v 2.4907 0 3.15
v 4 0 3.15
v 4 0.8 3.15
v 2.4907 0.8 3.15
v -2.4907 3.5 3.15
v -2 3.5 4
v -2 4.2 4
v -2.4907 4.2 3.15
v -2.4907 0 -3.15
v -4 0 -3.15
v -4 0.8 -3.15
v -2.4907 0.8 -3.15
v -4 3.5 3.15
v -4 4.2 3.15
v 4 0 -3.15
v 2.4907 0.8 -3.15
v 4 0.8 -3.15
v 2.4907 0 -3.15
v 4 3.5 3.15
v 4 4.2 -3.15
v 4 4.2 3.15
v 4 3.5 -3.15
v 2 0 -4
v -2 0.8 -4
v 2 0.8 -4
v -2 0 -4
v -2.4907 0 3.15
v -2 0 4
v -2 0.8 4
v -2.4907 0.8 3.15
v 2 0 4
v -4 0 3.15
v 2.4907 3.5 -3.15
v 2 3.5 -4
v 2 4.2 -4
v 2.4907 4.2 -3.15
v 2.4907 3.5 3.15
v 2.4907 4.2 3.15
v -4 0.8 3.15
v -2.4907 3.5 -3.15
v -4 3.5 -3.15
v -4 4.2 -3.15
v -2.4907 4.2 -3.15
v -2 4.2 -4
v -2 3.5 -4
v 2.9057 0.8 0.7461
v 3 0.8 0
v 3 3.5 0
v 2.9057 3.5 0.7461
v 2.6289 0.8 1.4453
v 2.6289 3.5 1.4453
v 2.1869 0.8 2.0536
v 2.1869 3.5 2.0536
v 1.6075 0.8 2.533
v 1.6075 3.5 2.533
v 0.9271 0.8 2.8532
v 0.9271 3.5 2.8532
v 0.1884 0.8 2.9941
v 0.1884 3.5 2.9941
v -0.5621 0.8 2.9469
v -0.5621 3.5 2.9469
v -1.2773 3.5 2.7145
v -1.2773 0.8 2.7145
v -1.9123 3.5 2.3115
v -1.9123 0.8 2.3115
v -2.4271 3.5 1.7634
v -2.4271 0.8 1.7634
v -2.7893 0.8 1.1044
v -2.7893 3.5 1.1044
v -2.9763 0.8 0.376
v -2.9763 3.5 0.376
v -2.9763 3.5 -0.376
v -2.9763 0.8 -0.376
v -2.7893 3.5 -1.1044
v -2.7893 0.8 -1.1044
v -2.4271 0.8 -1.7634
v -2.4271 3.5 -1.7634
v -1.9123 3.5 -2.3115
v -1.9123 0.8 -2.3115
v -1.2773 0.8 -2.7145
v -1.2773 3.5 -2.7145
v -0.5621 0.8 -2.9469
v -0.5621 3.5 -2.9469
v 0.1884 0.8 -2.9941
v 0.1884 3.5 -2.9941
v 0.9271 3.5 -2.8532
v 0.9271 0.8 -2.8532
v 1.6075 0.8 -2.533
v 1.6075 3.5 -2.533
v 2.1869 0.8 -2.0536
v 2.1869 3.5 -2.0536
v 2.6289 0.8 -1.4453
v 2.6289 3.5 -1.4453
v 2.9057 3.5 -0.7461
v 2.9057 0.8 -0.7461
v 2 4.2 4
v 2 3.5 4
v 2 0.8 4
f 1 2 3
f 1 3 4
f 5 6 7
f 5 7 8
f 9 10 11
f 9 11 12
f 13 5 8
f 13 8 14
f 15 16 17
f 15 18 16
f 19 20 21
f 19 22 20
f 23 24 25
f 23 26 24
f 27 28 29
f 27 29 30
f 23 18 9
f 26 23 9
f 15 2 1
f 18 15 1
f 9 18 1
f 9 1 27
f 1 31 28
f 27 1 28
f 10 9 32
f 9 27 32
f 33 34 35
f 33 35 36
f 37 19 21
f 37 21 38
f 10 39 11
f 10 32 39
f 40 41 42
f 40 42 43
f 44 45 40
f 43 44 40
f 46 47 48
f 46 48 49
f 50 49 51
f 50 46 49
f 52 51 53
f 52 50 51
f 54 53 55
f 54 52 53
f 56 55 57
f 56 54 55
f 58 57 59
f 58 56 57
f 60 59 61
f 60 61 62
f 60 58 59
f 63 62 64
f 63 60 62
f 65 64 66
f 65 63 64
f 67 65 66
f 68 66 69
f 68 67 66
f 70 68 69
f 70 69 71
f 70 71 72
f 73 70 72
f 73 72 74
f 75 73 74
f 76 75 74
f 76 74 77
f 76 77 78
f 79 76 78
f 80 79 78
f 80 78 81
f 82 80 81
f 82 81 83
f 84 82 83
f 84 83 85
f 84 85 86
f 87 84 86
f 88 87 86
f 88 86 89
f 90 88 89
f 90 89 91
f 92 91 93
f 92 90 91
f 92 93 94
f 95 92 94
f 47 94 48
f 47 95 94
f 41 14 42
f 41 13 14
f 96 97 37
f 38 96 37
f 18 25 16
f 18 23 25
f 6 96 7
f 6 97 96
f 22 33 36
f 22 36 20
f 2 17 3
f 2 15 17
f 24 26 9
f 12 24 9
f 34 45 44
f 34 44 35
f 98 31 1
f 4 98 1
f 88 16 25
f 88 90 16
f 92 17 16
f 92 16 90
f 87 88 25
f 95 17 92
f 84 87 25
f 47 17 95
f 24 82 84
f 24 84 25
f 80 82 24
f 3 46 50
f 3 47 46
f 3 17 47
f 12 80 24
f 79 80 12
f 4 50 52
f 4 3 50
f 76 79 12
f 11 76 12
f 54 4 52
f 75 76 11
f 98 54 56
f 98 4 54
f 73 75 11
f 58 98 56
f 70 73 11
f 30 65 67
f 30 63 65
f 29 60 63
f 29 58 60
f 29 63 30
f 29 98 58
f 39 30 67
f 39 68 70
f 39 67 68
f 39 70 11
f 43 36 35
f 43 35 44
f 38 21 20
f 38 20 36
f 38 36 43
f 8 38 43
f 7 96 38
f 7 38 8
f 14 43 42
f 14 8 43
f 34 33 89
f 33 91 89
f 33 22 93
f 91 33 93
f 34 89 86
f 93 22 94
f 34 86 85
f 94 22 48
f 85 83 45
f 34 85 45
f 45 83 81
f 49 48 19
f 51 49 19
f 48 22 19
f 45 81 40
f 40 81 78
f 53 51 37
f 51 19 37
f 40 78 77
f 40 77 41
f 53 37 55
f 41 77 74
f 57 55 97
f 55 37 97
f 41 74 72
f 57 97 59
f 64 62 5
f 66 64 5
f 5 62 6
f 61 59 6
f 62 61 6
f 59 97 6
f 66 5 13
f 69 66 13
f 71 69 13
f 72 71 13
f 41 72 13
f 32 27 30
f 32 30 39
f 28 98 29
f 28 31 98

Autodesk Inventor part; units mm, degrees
ref_plane "YZ Plane" through (0, 0, 0) normal (1, 0, 0) x (0, 1, 0)
ref_plane "XZ Plane" through (0, 0, 0) normal (0, 1, 0) x (-1, 0, 0)
ref_plane "XY Plane" through (0, 0, 0) normal (0, 0, 1) x (1, 0, 0)
sketch "Sketch1" plane through (0, 0, 0) normal (0, 1, 0) x (-1, 0, 0)
  line L0 (-4, 3.15) -> (4, 3.15)
  line L1 (4, 3.15) -> (4, -3.15)
  line L2 (4, -3.15) -> (-4, -3.15)
  line L3 (-4, -3.15) -> (-4, 3.15)
  line L4 (-4, 3.15) -> (4, -3.15) construction
  line L5 (4, 3.15) -> (-4, -3.15) construction
  line L6 (-2, 4) -> (2, 4)
  line L7 (2, 4) -> (2, -4)
  line L8 (2, -4) -> (-2, -4)
  line L9 (-2, -4) -> (-2, 4)
  line L10 (-2, 4) -> (2, -4) construction
  line L11 (2, 4) -> (-2, -4) construction
  line L12 (2, -4) -> (2.4907, -3.15)
  line L13 (2, -4) -> (2.9815, -4) construction
  line L14 (-2, -4) -> (-2.4907, -3.15)
  line L15 (-2, -4) -> (-1.0185, -4) construction
  line L16 (-2, 4) -> (-2.4907, 3.15)
  line L17 (-2, 4) -> (-1.0185, 4) construction
  line L18 (2, 4) -> (2.4907, 3.15)
  line L19 (2, 4) -> (2.9815, 4) construction
  point P0 (0, 0)
  dimension "d0" = 8
  dimension "d1" = 6.3
  dimension "d2" = 4
  dimension "d3" = 8
  dimension "d4" = 60
  dimension "d5" = 120
  dimension "d6" = 120
  dimension "d7" = 60
extrude "Extrusion1" add sketch "Sketch1" along normal blind 4.2
extrude "Extrusion2" cut sketch "Sketch1" along normal blind 3.5
extrude "Extrusion3" add sketch "Sketch1" along normal blind 0.8
sketch "Sketch2" plane through (0, 0.8, 0) normal (0, 1, 0) x (1, 0, 0)
  circle A0 centre (0, 0) radius 3
  dimension "d14" = 6
extrude "Extrusion4" add sketch "Sketch2" along normal up to next
properties part number "inductor"
